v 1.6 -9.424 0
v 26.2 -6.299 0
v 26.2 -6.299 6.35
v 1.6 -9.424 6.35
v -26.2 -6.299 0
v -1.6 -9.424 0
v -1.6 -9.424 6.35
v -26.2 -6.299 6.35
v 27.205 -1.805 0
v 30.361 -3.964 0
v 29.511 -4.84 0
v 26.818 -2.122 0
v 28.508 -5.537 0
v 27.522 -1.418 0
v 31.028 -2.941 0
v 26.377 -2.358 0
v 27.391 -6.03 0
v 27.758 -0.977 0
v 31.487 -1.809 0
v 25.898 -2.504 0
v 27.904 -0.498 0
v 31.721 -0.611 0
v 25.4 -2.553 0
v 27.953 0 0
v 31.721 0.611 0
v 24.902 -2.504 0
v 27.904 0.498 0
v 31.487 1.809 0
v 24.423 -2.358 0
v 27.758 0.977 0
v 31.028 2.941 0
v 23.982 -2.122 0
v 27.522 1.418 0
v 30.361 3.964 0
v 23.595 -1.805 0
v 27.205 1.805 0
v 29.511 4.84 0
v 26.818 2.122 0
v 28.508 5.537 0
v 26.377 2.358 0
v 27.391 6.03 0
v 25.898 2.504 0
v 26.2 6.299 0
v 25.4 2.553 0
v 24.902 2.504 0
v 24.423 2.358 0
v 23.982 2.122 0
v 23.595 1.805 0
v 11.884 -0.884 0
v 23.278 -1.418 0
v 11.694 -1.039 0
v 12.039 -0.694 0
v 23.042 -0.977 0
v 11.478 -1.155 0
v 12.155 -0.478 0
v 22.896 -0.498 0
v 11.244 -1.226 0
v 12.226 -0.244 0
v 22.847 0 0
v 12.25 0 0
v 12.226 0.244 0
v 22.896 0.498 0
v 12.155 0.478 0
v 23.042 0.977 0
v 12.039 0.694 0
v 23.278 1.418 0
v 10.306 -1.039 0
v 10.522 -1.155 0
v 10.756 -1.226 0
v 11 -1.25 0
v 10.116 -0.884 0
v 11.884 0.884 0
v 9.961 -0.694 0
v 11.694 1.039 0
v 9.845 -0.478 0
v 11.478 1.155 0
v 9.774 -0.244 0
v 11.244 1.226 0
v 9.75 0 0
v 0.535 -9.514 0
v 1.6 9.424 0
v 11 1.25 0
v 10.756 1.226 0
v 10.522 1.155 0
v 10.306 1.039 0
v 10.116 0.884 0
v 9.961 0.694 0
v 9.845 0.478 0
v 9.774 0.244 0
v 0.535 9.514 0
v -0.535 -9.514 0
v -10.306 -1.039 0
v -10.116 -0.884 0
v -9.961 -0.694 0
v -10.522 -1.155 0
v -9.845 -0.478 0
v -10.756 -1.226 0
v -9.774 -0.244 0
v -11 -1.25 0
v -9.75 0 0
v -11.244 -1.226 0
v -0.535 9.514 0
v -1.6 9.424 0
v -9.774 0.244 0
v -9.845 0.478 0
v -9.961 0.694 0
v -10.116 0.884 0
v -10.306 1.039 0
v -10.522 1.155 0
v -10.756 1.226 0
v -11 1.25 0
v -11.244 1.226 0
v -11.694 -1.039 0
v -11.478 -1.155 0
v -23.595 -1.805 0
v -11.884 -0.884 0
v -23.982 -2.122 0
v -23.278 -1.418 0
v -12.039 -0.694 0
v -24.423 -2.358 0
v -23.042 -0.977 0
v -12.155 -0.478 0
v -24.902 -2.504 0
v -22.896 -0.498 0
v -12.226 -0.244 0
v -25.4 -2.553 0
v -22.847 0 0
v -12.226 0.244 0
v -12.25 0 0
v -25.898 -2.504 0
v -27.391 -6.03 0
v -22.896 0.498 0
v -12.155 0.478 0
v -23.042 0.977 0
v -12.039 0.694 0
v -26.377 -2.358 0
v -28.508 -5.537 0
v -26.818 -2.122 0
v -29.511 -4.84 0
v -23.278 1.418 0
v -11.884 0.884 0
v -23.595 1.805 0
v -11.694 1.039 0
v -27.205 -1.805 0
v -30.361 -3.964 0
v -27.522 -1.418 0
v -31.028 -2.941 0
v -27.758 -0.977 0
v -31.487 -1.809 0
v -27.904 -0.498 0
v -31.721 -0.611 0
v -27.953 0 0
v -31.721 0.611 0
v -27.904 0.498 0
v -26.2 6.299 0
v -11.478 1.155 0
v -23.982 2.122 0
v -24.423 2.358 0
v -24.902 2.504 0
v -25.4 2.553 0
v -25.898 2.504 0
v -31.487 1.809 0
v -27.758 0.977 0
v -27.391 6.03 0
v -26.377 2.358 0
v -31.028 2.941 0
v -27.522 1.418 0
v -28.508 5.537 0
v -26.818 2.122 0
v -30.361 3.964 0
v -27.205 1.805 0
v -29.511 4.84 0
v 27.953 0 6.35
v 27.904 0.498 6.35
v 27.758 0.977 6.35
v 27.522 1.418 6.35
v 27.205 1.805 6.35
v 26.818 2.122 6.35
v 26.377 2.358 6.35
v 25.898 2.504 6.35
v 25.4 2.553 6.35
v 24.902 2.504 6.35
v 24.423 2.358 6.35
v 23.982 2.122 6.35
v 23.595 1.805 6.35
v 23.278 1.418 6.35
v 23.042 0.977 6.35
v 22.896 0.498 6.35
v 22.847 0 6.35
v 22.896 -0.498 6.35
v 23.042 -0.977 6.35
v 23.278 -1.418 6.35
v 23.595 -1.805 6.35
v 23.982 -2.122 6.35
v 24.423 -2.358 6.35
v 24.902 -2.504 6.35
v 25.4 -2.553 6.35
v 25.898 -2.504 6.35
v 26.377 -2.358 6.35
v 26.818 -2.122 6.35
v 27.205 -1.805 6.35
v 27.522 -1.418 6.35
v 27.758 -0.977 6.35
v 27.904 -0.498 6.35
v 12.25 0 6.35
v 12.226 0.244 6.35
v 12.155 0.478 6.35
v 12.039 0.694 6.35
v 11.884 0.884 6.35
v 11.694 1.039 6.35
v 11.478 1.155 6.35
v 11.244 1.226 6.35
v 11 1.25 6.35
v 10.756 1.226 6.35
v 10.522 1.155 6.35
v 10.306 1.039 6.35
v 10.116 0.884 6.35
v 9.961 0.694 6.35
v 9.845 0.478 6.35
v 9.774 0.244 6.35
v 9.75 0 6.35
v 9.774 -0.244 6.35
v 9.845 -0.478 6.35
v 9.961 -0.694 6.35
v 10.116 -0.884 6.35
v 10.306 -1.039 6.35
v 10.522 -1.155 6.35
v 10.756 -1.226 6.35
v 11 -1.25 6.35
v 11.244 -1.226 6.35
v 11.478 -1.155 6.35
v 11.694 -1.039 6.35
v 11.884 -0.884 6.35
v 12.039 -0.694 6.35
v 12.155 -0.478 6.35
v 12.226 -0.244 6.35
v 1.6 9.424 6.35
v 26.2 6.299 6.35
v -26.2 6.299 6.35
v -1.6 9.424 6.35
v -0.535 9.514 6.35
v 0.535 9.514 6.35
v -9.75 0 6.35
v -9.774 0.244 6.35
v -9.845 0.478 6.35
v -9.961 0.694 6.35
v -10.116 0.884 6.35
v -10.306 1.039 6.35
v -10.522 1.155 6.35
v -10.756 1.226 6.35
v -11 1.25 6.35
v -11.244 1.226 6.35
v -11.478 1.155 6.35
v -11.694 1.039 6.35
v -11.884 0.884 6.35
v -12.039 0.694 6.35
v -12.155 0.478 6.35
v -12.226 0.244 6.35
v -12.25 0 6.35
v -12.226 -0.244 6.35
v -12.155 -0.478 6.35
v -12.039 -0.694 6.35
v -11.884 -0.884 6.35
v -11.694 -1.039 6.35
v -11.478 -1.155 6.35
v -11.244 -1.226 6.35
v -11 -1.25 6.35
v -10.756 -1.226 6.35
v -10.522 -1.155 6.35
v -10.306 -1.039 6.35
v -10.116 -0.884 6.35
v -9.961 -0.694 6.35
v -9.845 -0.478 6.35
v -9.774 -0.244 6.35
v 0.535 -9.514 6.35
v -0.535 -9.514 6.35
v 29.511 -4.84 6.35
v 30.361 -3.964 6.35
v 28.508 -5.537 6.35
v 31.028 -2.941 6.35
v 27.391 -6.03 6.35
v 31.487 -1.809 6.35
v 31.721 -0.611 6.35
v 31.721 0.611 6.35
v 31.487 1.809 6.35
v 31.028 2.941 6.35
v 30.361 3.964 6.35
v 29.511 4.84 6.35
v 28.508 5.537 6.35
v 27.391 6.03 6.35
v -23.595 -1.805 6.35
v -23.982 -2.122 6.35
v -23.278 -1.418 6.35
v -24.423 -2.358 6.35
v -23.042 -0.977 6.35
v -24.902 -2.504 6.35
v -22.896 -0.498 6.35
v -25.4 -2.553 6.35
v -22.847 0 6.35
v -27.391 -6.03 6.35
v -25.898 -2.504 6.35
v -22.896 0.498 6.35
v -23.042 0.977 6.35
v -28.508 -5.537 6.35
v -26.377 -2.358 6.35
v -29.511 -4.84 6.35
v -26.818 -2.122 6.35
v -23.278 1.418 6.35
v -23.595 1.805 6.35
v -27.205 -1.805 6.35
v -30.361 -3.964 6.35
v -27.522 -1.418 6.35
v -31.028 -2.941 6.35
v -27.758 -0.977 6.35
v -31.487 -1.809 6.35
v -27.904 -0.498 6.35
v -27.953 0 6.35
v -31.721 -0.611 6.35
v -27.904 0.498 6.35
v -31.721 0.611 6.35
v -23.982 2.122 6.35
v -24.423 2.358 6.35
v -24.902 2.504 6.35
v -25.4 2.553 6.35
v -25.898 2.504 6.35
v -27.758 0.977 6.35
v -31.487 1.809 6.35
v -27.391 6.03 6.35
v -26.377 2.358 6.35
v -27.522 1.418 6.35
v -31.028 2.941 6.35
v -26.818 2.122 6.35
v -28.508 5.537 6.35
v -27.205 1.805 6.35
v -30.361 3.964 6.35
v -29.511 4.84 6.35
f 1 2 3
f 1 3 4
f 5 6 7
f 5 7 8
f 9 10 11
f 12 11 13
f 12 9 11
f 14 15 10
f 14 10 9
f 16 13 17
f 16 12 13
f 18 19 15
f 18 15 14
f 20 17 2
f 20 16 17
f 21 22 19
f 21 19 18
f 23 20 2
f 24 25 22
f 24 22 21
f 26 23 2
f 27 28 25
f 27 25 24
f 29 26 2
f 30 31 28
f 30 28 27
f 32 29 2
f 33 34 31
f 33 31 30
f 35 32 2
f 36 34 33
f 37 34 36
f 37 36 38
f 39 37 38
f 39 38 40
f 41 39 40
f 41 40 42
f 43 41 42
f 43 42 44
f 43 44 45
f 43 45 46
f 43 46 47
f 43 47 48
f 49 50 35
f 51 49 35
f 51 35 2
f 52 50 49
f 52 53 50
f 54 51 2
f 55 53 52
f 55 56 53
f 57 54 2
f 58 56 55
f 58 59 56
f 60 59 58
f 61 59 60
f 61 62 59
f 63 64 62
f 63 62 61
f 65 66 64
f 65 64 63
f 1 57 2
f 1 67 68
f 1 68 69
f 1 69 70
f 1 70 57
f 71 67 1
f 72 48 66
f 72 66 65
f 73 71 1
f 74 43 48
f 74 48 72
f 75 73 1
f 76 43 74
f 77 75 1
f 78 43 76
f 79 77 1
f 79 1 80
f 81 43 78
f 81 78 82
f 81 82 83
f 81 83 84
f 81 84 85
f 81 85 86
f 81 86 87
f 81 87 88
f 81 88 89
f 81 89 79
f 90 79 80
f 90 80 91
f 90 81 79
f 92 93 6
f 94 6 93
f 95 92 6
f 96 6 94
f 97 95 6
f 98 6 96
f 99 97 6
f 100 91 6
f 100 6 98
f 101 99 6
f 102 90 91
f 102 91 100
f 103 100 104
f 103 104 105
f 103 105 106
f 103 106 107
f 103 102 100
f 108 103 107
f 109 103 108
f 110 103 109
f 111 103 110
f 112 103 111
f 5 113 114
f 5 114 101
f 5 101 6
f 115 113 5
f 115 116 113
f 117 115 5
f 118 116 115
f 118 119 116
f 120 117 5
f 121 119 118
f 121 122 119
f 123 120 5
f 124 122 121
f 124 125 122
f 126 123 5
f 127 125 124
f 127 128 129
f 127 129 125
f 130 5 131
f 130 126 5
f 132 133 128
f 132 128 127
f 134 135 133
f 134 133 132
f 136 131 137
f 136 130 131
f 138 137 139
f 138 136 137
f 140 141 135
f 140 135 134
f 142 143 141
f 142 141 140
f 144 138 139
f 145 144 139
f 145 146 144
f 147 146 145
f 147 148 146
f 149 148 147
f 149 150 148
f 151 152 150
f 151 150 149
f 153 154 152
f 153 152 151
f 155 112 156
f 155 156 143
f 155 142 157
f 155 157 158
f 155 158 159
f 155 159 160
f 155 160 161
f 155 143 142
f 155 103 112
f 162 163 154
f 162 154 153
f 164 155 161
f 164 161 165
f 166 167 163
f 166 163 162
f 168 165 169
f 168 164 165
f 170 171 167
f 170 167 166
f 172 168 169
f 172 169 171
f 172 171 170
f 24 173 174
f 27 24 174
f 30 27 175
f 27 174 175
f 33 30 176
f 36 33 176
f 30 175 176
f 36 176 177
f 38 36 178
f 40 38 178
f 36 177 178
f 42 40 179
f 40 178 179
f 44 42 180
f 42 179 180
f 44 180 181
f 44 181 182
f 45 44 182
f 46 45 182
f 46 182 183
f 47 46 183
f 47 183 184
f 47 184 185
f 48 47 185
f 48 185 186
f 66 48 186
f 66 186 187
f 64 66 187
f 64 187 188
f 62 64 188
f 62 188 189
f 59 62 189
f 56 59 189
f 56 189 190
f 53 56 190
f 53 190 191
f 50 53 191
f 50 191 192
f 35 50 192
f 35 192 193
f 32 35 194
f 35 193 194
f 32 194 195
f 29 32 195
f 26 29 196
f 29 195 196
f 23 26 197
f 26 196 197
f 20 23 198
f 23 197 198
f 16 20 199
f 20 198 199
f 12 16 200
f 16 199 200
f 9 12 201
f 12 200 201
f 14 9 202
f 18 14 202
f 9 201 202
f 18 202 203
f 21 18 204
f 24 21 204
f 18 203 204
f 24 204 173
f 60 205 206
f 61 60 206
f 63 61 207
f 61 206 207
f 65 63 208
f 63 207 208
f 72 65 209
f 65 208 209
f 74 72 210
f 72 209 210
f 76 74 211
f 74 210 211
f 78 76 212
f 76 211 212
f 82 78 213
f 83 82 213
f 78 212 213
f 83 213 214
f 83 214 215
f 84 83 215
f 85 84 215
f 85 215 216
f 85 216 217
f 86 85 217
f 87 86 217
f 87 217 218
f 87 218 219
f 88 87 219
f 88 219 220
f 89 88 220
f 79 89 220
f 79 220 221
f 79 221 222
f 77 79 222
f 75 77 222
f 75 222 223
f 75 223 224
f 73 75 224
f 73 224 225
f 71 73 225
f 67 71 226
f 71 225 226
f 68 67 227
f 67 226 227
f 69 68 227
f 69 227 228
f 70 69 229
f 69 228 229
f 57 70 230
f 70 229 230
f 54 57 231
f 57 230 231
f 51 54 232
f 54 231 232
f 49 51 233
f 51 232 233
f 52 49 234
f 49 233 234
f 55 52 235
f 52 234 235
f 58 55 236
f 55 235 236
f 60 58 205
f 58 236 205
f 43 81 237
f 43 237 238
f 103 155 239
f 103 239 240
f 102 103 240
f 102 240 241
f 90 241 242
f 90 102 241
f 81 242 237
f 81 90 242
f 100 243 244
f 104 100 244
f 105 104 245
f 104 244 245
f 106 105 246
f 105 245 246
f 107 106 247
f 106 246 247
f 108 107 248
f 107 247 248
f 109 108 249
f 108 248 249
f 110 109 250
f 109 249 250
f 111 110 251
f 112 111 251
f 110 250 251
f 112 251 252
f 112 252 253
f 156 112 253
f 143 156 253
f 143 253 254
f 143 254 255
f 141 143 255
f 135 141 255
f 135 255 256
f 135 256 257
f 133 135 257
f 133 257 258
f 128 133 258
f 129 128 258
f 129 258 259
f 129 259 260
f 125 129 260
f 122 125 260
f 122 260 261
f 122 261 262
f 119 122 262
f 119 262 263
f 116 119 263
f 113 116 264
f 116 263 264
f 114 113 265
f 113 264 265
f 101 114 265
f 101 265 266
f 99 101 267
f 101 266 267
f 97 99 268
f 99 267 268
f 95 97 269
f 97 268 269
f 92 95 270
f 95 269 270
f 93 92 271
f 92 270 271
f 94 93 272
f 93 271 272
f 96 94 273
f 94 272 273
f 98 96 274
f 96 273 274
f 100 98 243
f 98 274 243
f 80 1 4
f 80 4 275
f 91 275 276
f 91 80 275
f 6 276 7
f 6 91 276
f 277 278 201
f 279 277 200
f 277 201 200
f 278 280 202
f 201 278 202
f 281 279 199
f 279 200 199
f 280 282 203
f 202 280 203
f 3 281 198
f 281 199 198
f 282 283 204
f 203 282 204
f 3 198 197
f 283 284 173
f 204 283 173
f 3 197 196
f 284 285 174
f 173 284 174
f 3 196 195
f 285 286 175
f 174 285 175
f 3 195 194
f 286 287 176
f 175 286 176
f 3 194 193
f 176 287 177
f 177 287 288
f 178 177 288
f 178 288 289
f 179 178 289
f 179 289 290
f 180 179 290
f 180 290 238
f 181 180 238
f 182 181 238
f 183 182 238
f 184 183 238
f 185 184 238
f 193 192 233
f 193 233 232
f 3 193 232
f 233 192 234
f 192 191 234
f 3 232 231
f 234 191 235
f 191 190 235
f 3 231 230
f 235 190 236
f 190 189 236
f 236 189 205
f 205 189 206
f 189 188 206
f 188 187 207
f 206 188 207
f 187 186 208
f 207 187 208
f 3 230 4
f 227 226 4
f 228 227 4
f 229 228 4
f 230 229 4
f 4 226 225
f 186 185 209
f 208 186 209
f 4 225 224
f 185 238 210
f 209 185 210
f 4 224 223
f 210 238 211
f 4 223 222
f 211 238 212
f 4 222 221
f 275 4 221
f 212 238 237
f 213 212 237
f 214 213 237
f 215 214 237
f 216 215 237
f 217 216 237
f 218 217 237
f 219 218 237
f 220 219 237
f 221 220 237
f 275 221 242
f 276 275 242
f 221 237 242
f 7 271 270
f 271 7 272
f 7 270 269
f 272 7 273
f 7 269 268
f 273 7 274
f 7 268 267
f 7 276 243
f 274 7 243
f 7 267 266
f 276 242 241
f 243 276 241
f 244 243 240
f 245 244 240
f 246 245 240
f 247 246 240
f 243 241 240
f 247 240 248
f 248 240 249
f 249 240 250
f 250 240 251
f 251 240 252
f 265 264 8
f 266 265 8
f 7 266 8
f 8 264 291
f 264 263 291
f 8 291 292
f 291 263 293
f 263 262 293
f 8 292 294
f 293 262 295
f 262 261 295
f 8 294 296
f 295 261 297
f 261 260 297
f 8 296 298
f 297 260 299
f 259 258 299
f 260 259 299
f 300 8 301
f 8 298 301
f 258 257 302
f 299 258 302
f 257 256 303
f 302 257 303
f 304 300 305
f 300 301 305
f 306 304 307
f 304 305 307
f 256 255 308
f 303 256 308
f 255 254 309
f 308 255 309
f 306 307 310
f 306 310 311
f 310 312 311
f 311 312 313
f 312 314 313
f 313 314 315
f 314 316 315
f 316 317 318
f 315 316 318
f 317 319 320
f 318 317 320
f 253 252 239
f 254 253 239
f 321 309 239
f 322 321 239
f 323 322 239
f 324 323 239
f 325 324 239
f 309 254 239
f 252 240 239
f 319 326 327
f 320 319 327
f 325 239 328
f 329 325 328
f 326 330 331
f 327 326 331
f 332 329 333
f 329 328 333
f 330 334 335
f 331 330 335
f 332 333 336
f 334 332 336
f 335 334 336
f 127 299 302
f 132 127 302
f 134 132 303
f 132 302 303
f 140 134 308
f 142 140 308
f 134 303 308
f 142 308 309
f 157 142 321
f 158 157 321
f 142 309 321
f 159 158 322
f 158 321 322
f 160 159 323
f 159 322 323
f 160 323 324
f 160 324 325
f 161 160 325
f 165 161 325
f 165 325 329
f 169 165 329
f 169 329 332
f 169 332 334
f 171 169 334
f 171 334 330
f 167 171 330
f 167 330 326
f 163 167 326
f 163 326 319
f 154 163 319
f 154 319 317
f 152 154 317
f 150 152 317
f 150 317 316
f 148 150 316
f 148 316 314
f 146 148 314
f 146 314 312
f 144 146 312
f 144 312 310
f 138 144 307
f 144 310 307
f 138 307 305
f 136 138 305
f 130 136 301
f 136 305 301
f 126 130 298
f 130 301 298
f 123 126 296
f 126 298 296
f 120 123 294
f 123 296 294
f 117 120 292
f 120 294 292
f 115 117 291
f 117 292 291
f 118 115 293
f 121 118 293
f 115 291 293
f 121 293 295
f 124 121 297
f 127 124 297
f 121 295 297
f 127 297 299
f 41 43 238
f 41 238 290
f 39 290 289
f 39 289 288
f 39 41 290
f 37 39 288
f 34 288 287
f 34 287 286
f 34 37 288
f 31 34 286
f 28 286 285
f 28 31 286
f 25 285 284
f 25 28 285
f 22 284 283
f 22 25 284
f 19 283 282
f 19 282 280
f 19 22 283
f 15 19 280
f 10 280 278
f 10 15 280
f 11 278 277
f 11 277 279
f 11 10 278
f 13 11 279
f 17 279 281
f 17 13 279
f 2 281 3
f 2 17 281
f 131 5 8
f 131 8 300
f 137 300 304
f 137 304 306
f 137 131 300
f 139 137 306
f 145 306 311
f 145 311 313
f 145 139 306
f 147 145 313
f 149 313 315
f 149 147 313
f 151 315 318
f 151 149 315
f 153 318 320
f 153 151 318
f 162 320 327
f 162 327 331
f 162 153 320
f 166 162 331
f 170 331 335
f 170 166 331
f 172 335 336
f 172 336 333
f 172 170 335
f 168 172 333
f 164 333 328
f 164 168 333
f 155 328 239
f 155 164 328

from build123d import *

# Parameters (mm, degrees)
BOSS_EXTRUDE1_DEPTH       = 6.35
M3X0_5_TAPPED_HOLE1_D     = 2.5
M3X0_5_TAPPED_HOLE1_DEPTH = 6.35
F_10_CLEARANCE_HOLE1_D    = 5.1054


with BuildPart() as part:
    # Sketch1 → Boss-Extrude1 (new body)
    with BuildSketch(Plane.XY):
        with BuildLine():
            Line((1.600151217, 9.423790263), (26.200075609, 6.299395131))
            ThreePointArc((26.200075609, 6.299395131), (31.75, 0), (26.200075609, -6.299395131))
            Line((26.200075609, -6.299395131), (1.600151217, -9.423790263))
            ThreePointArc((1.600151217, -9.423790263), (0, -9.525), (-1.600151217, -9.423790263))
            Line((-1.600151217, -9.423790263), (-26.200075609, -6.299395131))
            ThreePointArc((-26.200075609, -6.299395131), (-31.75, 0), (-26.200075609, 6.299395131))
            Line((-26.200075609, 6.299395131), (-1.600151217, 9.423790263))
            ThreePointArc((-1.600151217, 9.423790263), (0, 9.525), (1.600151217, 9.423790263))
        make_face()
    extrude(amount=BOSS_EXTRUDE1_DEPTH)

    # M3x0.5 Tapped Hole1
    with Locations(Plane(origin=(0, 0, 0), x_dir=(-1, 0, 0), z_dir=(0, 0, -1))):
        with Locations((-11, 0), (11, 0)):
            Hole(M3X0_5_TAPPED_HOLE1_D / 2, depth=M3X0_5_TAPPED_HOLE1_DEPTH)

    # #10 Clearance Hole1 (through all)
    with Locations(Plane(origin=(0, 0, 0), x_dir=(-1, 0, 0), z_dir=(0, 0, -1))):
        with Locations((25.4, 0), (-25.4, 0)):
            Hole(F_10_CLEARANCE_HOLE1_D / 2)


solid = part.part
